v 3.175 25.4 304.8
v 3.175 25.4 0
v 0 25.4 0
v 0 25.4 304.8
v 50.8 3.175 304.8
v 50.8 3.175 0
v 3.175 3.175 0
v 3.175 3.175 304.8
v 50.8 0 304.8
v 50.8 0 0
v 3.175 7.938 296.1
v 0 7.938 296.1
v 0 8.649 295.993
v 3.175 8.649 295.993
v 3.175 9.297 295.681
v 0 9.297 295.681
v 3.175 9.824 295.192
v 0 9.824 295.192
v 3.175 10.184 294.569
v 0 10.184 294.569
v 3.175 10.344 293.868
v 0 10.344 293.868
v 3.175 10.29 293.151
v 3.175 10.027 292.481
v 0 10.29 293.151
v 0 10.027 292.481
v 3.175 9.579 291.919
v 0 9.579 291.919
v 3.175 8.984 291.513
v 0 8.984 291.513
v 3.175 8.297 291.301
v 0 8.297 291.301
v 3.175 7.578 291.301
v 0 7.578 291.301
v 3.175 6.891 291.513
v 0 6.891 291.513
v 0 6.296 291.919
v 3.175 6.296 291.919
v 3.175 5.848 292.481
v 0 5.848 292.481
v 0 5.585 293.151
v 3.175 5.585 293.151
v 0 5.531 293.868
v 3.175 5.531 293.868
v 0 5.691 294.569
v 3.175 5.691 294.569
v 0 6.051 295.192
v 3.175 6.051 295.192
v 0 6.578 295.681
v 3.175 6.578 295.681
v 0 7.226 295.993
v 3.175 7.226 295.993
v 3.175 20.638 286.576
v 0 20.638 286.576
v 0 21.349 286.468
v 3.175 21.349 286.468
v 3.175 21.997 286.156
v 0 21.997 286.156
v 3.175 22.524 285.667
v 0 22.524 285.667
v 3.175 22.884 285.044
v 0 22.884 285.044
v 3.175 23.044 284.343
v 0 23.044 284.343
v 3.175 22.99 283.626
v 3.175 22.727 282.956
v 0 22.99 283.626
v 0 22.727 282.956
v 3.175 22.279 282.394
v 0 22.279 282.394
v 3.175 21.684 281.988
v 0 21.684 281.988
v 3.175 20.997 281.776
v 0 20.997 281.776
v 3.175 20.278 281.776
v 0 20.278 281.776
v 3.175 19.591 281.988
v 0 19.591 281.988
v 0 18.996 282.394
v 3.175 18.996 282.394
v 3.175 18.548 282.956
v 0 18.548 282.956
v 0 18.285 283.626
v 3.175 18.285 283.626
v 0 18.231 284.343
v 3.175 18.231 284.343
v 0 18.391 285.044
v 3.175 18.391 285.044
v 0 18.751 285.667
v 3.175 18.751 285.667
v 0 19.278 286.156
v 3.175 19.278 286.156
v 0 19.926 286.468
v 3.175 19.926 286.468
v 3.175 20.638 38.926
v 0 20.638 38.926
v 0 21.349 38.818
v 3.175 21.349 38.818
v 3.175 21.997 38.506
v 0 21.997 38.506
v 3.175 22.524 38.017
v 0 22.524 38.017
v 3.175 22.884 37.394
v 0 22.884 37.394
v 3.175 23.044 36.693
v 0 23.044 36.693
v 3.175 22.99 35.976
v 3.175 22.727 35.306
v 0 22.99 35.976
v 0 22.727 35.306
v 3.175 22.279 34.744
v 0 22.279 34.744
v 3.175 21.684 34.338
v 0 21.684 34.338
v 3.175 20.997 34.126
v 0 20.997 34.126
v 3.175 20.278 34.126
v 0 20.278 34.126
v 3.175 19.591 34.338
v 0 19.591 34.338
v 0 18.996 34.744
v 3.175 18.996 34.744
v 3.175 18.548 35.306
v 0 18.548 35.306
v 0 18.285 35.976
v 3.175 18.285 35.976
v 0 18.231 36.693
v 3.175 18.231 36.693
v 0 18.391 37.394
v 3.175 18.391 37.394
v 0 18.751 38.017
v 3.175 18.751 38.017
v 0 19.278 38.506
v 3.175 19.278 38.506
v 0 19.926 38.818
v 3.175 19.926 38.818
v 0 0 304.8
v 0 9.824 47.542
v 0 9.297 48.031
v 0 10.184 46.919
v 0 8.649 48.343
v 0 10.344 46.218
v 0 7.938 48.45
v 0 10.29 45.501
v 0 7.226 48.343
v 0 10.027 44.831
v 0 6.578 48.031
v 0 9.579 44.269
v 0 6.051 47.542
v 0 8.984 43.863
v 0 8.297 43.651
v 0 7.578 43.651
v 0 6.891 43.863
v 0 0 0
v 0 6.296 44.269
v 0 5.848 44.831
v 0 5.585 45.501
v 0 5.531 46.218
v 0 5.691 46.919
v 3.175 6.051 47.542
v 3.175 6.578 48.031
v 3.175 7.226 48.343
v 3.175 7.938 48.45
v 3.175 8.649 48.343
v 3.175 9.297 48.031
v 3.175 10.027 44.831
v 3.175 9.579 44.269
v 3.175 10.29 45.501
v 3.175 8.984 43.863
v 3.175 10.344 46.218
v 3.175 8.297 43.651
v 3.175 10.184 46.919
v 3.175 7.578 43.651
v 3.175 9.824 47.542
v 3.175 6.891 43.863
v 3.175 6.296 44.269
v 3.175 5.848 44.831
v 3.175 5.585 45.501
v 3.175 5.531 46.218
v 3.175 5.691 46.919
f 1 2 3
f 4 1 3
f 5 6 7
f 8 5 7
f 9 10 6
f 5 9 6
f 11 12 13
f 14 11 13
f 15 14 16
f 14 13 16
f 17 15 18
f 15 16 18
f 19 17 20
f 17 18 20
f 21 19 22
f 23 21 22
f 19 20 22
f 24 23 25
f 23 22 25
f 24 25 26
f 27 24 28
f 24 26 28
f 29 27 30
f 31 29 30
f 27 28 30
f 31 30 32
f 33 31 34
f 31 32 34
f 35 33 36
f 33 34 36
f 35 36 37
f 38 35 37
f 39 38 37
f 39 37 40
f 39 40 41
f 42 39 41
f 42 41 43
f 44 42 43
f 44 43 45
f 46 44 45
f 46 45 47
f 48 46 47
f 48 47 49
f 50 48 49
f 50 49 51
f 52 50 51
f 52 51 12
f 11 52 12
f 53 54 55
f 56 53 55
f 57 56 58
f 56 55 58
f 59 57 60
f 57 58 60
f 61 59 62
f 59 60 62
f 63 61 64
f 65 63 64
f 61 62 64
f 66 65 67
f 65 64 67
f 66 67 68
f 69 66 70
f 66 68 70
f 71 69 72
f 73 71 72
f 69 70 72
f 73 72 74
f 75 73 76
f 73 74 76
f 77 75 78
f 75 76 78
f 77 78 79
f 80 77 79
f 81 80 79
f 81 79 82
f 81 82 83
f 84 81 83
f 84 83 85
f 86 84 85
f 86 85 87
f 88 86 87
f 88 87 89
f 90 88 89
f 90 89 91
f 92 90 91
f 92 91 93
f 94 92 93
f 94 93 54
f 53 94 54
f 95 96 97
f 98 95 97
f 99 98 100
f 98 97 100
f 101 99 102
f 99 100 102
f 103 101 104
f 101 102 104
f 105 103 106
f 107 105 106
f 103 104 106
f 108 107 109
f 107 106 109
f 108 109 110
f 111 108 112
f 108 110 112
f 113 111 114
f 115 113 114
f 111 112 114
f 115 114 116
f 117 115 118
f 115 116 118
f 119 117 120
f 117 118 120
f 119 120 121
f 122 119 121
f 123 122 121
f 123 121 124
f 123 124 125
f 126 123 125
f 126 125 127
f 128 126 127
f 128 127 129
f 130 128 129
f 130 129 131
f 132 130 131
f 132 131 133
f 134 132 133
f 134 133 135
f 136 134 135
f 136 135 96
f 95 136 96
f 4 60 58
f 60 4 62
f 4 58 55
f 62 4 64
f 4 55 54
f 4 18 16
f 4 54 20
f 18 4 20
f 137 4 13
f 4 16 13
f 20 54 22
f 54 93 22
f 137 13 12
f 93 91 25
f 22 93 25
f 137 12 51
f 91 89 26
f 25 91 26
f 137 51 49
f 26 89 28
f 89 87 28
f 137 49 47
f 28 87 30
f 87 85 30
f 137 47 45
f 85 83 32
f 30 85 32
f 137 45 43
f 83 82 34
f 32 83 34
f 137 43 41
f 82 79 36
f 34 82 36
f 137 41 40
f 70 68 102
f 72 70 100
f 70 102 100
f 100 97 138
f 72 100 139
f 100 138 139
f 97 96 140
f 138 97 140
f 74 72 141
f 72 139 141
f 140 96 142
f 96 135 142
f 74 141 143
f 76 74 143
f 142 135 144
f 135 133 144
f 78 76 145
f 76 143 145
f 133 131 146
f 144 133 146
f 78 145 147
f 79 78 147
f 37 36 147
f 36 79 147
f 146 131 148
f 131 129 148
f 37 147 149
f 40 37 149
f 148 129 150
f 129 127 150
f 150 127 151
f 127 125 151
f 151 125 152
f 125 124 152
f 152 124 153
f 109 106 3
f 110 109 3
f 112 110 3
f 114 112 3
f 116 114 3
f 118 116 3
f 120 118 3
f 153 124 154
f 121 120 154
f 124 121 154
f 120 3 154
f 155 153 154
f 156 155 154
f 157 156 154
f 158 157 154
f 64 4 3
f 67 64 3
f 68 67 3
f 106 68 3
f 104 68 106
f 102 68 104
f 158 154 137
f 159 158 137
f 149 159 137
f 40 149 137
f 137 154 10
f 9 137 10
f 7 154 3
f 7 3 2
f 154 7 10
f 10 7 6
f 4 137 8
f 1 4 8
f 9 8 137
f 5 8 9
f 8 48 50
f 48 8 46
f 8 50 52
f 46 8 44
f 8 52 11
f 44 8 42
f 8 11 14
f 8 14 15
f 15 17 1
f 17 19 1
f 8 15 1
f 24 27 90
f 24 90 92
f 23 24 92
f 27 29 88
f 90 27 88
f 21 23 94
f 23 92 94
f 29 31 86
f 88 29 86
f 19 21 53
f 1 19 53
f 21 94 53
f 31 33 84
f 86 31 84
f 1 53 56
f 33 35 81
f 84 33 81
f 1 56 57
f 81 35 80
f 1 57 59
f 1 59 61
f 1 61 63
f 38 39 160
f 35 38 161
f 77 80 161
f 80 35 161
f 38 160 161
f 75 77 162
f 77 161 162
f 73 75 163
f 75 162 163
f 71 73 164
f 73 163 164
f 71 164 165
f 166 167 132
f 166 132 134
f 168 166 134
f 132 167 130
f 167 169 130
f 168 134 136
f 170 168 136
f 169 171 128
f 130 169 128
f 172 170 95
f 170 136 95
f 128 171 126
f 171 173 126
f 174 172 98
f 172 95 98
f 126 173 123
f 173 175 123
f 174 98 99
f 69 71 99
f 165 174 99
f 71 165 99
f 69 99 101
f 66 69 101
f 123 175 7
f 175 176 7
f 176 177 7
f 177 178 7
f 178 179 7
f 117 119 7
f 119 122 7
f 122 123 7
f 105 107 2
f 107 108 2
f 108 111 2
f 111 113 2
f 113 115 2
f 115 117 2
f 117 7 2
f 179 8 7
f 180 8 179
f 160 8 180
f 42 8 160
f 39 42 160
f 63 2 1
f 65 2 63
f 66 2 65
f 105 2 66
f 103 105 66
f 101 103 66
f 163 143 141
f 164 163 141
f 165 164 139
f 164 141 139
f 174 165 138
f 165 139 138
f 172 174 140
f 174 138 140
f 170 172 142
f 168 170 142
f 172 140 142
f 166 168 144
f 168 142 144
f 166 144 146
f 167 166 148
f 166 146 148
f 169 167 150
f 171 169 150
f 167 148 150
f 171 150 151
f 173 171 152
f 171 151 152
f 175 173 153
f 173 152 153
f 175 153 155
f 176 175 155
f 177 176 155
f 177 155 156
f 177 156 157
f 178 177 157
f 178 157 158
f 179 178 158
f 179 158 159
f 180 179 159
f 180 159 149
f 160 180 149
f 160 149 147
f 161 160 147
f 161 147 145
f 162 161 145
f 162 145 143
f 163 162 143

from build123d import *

# Parameters (mm, degrees)
BOSS_EXTRUDE1_DEPTH = 304.8
CUT_EXTRUDE1_REACH  = 312.047
SKETCH2_R           = 2.413


with BuildPart() as part:
    # Sketch1 → Boss-Extrude1 (new body)
    with BuildSketch(Plane.XY):
        Polygon((3.175, 3.175), (3.175, 25.4), (0, 25.4), (0, 0), (50.8, 0), (50.8, 3.175), align=None)
    extrude(amount=BOSS_EXTRUDE1_DEPTH)

    # Sketch2 → Cut-Extrude1 (cut, up to next)
    with BuildSketch(Plane.ZY, mode=Mode.PRIVATE) as cut_extrude1_sk1:
        with Locations((36.5125, 20.6375)):
            Circle(SKETCH2_R)
    cut_extrude1_tool1 = extrude(cut_extrude1_sk1.sketch, amount=-CUT_EXTRUDE1_REACH, mode=Mode.PRIVATE) & part.part
    # Sketch2 → Cut-Extrude1 (cut, up to next)
    with BuildSketch(Plane.ZY, mode=Mode.PRIVATE) as cut_extrude1_sk2:
        with Locations((46.0375, 7.9375)):
            Circle(SKETCH2_R)
    cut_extrude1_tool2 = extrude(cut_extrude1_sk2.sketch, amount=-CUT_EXTRUDE1_REACH, mode=Mode.PRIVATE) & part.part
    # Sketch2 → Cut-Extrude1 (cut, up to next)
    with BuildSketch(Plane.ZY, mode=Mode.PRIVATE) as cut_extrude1_sk3:
        with Locations((284.1625, 20.6375)):
            Circle(SKETCH2_R)
    cut_extrude1_tool3 = extrude(cut_extrude1_sk3.sketch, amount=-CUT_EXTRUDE1_REACH, mode=Mode.PRIVATE) & part.part
    # Sketch2 → Cut-Extrude1 (cut, up to next)
    with BuildSketch(Plane.ZY, mode=Mode.PRIVATE) as cut_extrude1_sk4:
        with Locations((293.6875, 7.9375)):
            Circle(SKETCH2_R)
    cut_extrude1_tool4 = extrude(cut_extrude1_sk4.sketch, amount=-CUT_EXTRUDE1_REACH, mode=Mode.PRIVATE) & part.part
    add(cut_extrude1_tool1.solids().sort_by_distance((0, 20.6375, 36.5125))[0], mode=Mode.SUBTRACT)
    add(cut_extrude1_tool2.solids().sort_by_distance((0, 7.9375, 46.0375))[0], mode=Mode.SUBTRACT)
    add(cut_extrude1_tool3.solids().sort_by_distance((0, 20.6375, 284.1625))[0], mode=Mode.SUBTRACT)
    add(cut_extrude1_tool4.solids().sort_by_distance((0, 7.9375, 293.6875))[0], mode=Mode.SUBTRACT)


solid = part.part
